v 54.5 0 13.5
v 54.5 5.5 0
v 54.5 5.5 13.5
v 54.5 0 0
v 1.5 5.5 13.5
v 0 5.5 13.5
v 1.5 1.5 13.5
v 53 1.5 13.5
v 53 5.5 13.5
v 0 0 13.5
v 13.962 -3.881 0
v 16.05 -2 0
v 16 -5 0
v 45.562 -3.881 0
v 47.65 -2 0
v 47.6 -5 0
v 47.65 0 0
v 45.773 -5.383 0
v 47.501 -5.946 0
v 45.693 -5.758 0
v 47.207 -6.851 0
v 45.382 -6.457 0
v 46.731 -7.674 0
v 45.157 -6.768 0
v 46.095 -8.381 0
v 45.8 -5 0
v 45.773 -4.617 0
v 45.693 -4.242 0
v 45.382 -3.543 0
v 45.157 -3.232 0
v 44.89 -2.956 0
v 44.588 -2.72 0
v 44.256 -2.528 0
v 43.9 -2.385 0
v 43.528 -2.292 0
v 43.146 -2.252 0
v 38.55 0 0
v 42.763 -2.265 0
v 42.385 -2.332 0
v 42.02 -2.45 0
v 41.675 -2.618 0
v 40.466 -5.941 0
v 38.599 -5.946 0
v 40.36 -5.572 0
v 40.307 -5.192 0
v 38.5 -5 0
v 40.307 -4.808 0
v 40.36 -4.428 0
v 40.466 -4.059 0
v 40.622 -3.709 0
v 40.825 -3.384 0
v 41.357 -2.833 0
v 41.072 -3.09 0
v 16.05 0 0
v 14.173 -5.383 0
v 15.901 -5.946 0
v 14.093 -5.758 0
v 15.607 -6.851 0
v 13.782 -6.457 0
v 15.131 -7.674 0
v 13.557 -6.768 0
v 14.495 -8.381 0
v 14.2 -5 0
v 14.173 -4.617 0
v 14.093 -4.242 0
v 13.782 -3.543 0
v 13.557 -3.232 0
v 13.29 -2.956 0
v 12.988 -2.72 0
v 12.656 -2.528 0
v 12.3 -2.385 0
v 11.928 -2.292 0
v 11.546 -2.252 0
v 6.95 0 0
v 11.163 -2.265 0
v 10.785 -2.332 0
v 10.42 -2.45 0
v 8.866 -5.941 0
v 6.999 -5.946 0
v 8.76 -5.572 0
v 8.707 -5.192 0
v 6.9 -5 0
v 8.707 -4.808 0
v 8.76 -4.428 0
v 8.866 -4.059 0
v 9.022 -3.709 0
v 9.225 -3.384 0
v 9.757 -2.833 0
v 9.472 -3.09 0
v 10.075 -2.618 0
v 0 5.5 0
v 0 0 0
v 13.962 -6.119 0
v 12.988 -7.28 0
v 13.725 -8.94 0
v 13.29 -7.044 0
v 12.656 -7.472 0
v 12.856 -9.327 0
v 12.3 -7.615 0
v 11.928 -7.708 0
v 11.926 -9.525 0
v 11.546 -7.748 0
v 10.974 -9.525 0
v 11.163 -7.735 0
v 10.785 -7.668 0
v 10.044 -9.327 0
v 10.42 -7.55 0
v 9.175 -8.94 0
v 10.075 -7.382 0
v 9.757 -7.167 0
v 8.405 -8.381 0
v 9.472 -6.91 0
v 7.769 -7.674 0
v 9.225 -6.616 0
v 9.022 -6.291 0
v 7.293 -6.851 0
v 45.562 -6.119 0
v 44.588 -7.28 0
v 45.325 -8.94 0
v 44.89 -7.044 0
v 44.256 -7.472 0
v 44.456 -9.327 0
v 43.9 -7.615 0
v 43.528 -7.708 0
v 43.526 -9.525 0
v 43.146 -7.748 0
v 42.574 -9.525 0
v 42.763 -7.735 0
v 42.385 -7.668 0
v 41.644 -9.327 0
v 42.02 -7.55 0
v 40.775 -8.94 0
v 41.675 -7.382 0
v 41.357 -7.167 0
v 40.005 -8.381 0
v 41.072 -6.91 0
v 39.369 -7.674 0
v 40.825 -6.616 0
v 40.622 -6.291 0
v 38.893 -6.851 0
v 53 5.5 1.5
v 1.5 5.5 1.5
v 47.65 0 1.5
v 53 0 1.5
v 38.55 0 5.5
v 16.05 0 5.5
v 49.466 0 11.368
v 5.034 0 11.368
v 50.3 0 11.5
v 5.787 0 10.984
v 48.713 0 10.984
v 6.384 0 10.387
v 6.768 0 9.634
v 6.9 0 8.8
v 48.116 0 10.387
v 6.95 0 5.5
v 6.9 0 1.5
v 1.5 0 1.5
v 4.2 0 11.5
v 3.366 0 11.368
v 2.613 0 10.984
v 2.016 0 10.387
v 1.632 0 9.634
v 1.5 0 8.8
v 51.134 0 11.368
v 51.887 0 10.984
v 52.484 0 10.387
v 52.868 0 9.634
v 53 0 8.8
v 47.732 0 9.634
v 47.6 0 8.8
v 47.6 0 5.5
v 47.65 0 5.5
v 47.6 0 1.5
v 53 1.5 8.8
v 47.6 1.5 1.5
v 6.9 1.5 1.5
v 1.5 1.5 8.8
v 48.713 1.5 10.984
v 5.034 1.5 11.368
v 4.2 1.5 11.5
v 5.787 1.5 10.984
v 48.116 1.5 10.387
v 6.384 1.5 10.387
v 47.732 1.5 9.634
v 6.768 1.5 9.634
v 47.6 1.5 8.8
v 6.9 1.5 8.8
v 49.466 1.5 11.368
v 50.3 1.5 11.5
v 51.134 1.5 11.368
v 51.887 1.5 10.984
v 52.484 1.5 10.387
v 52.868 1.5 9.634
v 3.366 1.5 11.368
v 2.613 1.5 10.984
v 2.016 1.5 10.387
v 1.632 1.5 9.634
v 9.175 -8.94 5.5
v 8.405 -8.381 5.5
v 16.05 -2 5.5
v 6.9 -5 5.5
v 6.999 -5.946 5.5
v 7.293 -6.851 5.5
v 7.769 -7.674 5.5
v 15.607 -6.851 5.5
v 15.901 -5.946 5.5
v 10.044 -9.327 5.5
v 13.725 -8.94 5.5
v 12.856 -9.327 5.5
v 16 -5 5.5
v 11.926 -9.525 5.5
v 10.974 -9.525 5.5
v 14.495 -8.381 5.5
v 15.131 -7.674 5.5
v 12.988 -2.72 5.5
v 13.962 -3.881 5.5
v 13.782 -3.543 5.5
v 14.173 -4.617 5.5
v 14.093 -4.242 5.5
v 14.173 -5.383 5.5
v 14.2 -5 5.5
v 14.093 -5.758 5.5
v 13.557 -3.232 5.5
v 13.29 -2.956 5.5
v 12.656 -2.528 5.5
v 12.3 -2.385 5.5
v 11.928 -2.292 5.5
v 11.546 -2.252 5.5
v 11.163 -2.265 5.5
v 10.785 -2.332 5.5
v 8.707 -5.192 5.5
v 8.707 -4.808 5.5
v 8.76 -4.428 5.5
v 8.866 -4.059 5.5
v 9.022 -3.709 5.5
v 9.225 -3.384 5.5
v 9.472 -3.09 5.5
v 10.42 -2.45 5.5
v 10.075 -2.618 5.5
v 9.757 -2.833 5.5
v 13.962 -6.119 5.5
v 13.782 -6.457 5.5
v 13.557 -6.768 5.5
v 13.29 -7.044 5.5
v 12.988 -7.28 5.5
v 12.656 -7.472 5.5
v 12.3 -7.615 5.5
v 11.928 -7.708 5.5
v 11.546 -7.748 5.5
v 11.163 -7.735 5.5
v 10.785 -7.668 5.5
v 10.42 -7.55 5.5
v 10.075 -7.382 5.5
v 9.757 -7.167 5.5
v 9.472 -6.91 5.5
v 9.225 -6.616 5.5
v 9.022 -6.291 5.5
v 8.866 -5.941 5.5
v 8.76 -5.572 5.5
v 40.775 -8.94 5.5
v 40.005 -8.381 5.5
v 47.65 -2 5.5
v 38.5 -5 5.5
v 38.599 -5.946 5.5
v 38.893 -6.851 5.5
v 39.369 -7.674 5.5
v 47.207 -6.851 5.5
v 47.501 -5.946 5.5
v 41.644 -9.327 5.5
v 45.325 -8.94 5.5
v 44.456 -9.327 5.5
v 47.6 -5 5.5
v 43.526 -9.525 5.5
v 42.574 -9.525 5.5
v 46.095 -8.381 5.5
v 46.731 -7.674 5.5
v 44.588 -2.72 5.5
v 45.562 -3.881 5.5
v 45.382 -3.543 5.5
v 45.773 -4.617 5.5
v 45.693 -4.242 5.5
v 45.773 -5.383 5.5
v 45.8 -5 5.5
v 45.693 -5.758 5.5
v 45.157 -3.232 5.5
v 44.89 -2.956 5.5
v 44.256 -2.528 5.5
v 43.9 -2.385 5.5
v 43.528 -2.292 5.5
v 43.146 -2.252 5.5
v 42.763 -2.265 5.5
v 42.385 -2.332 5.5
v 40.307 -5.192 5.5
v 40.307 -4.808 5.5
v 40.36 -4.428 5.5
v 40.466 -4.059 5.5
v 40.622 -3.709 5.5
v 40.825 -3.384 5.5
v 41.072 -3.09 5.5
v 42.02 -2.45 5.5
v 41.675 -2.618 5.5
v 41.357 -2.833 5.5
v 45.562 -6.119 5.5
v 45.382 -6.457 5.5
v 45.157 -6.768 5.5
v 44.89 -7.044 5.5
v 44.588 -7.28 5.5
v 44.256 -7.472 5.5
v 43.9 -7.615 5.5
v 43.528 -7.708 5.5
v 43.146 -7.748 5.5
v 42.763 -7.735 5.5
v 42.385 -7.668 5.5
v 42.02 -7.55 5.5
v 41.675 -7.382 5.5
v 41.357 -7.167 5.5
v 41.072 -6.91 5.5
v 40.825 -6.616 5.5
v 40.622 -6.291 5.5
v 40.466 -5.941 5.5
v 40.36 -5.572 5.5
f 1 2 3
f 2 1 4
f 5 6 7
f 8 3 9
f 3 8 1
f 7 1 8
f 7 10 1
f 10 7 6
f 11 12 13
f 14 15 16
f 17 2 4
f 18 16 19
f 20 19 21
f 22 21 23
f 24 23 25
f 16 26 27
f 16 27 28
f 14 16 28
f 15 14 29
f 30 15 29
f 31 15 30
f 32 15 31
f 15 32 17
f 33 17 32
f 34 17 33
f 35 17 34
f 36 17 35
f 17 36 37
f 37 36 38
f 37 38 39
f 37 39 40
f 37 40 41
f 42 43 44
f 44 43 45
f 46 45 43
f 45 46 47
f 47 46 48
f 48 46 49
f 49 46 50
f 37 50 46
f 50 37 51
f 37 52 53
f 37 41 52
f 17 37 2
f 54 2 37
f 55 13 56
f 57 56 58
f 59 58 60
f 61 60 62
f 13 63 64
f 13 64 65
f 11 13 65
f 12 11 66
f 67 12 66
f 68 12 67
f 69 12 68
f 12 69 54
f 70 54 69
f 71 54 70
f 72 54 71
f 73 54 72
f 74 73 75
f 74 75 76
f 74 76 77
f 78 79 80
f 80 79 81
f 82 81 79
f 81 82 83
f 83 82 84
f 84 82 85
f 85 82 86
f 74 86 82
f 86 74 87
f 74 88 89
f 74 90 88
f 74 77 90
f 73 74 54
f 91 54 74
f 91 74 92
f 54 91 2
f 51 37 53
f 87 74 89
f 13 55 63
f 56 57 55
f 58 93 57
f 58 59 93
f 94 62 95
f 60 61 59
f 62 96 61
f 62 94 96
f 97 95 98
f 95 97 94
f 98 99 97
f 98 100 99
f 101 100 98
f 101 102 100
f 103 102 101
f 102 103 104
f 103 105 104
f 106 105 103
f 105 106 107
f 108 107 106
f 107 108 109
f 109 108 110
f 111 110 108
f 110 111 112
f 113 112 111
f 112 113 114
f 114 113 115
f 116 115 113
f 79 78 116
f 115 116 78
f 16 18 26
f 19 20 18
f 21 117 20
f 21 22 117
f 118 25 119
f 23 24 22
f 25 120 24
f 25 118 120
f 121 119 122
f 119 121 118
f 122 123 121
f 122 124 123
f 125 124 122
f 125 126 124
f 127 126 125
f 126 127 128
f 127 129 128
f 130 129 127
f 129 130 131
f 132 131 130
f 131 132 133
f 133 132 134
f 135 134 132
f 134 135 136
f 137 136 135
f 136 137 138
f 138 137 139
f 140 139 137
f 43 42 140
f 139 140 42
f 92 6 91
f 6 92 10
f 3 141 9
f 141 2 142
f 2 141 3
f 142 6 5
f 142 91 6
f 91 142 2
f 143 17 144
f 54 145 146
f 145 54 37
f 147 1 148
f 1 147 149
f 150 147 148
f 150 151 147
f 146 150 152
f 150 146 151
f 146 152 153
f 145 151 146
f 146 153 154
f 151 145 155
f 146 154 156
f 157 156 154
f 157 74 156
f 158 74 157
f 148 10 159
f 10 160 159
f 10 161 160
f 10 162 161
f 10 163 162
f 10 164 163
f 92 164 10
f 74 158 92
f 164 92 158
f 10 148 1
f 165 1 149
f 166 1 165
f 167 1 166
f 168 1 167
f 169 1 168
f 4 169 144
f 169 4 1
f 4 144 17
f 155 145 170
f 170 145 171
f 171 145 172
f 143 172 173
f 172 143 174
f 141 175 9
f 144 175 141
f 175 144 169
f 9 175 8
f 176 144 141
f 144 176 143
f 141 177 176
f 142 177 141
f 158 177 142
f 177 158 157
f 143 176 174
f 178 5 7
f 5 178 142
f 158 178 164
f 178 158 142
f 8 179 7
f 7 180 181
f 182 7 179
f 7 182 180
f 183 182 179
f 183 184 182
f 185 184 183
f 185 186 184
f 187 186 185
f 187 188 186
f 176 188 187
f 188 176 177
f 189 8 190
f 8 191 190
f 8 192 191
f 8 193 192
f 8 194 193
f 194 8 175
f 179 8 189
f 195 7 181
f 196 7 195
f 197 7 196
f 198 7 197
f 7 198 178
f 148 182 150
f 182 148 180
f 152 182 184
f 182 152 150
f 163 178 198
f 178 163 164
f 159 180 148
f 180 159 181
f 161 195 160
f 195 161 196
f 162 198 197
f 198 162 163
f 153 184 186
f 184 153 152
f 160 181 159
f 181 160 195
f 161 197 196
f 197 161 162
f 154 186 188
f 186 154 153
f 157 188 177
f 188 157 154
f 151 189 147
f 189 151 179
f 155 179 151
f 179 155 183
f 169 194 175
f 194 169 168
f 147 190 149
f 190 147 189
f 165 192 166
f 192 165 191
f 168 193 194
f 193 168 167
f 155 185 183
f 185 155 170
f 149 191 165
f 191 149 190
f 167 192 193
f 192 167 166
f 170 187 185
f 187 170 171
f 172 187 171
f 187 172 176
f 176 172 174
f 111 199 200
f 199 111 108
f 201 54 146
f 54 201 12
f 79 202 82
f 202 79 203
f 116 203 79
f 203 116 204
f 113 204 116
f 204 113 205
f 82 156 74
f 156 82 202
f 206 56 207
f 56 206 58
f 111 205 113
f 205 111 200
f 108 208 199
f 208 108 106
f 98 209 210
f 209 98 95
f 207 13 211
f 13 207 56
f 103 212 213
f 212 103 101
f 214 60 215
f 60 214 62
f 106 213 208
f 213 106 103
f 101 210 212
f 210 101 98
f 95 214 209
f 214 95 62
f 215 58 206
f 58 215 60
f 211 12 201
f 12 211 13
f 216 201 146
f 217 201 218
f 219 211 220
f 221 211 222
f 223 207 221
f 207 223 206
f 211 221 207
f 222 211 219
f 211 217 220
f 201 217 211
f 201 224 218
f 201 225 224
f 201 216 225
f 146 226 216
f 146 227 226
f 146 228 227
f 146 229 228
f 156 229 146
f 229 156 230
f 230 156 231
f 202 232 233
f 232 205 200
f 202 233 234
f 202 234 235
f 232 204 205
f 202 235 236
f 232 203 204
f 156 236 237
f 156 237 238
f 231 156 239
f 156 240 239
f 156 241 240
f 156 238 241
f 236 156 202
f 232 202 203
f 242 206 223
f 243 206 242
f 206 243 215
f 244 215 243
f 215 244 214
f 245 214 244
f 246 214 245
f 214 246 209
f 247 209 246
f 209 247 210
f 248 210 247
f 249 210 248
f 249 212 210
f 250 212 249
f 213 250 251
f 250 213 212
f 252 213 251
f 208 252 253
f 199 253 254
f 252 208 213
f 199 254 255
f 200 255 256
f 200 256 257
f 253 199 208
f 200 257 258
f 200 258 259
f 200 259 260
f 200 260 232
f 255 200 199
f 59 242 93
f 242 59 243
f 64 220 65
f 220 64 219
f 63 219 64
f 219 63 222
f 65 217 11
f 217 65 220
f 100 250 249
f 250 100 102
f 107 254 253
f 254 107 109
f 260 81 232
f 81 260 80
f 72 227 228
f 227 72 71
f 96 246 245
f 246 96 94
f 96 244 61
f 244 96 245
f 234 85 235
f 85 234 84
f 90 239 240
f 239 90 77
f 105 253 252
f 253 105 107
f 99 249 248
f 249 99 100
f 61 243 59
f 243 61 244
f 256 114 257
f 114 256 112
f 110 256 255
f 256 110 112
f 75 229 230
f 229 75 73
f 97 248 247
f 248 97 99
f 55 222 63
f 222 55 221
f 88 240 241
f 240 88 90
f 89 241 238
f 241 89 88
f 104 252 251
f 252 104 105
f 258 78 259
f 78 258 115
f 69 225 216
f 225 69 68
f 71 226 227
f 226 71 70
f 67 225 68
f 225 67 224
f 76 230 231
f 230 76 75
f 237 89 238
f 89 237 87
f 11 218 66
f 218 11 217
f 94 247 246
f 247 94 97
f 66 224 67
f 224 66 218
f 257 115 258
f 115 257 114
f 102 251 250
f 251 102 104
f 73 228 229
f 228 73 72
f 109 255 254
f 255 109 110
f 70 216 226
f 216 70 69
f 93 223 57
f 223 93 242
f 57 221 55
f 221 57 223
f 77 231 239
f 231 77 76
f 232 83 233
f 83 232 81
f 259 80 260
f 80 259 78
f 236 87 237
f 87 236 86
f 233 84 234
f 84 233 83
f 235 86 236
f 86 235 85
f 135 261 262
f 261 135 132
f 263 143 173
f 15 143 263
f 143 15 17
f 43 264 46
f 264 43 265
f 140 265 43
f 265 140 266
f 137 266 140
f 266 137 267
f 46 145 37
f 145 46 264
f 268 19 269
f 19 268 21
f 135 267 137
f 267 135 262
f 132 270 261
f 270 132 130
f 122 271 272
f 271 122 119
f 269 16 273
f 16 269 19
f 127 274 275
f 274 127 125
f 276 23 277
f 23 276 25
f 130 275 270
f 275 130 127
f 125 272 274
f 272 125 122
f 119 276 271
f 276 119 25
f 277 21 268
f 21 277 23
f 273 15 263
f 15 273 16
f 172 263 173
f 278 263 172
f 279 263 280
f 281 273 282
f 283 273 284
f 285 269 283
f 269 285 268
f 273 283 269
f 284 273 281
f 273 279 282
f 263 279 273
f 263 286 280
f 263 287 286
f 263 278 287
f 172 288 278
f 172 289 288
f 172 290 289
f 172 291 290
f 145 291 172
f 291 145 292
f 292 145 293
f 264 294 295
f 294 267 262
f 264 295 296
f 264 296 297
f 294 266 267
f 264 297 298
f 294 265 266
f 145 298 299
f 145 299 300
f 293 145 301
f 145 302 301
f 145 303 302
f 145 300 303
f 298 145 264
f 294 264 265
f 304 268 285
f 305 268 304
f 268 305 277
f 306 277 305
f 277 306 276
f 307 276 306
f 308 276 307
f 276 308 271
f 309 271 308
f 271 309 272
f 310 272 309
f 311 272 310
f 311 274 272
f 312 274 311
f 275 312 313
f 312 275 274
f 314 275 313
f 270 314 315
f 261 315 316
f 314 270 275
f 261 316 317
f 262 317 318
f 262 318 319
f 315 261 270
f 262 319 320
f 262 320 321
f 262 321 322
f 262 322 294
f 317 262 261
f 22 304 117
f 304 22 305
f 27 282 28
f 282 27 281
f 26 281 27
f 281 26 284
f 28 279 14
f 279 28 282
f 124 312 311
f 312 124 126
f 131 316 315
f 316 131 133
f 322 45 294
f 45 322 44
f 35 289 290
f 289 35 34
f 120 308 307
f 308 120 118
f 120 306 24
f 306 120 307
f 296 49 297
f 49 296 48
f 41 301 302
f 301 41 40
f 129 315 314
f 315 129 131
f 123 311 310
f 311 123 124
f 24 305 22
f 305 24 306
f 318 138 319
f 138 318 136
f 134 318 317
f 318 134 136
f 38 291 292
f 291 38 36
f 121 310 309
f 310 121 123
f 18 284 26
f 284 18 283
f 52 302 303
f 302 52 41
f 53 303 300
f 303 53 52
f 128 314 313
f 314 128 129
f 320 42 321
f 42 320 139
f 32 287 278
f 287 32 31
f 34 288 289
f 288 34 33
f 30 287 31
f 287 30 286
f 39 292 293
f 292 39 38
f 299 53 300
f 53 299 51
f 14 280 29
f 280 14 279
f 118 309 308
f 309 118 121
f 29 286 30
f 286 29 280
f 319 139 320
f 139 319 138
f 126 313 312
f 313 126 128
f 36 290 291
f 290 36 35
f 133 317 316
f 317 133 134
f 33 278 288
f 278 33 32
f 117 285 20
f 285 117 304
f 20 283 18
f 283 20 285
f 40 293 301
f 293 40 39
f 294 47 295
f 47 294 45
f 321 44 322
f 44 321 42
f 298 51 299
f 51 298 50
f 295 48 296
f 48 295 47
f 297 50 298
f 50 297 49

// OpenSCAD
// parameter
ledHolderLength = 0.5;

borderWidth = 1.5;
ledStripWidth = 51.5;
ledStripHeight = 10.5;
ledStripDepth = 4.0;

// connector hole
connHoleWidth = 5.4;
connHoleHeight = 10;
connHoleDepth = 1.6;

module basicPlate() {
    difference() {
        // led bar: 51.5 + Rand 2x 1.5 = 54.5
        totalPlateWidth = ledStripWidth + 2 * borderWidth;
        totalPlateHeight = ledStripHeight + 2 * borderWidth;
        cube([totalPlateWidth, ledStripDepth + borderWidth, totalPlateHeight]);
        translate([borderWidth, borderWidth, borderWidth]) {
            cube([ledStripWidth, ledStripDepth, ledStripHeight + borderWidth]);
        }
    }
}

module backPlate() {
    difference() {
        basicPlate();
        // connector space left
        translate([borderWidth, 0, borderWidth]) {
            connectorHole();
        }

        // connector space right
        translate([borderWidth + (ledStripWidth), connHoleDepth-0.1, borderWidth]) {
            rotate(180) connectorHole();
        }
    }
}


module connectorHole() {
    rotate(90, [-1,0,0]) {
        // 5.25/2 ~2.7
        translate([2.7, -7.3, 0]) cylinder(d = 5.4, h = 1.6, $fn=20);
    }
    cube([connHoleWidth, connHoleDepth, connHoleHeight-5.4/2]);
}

module holderPart() {
    holderHeight = 5.5;
    /* Distanz von Lochmittelpunkt zur geraden Kante
     * = translationY + cubeY
     */
    difference() {
        hull() {
            cylinder(h = holderHeight, d = 9.1, $fn=30);
            translate([-4.5, 2.5 + ledHolderLength, 0]) cube([9.1, 2, holderHeight]);
        }
        cylinder(h = 7.1, d = 5.5, $fn=45); // Loch
    }
}

module main() {
    backPlate(ledStripWidth, ledStripHeight, ledStripDepth, borderWidth);
    translate([11.45, (-4.5 - ledHolderLength), 0]) holderPart();
    translate([43.05, (-4.5 - ledHolderLength), 0]) holderPart();
}

main();
